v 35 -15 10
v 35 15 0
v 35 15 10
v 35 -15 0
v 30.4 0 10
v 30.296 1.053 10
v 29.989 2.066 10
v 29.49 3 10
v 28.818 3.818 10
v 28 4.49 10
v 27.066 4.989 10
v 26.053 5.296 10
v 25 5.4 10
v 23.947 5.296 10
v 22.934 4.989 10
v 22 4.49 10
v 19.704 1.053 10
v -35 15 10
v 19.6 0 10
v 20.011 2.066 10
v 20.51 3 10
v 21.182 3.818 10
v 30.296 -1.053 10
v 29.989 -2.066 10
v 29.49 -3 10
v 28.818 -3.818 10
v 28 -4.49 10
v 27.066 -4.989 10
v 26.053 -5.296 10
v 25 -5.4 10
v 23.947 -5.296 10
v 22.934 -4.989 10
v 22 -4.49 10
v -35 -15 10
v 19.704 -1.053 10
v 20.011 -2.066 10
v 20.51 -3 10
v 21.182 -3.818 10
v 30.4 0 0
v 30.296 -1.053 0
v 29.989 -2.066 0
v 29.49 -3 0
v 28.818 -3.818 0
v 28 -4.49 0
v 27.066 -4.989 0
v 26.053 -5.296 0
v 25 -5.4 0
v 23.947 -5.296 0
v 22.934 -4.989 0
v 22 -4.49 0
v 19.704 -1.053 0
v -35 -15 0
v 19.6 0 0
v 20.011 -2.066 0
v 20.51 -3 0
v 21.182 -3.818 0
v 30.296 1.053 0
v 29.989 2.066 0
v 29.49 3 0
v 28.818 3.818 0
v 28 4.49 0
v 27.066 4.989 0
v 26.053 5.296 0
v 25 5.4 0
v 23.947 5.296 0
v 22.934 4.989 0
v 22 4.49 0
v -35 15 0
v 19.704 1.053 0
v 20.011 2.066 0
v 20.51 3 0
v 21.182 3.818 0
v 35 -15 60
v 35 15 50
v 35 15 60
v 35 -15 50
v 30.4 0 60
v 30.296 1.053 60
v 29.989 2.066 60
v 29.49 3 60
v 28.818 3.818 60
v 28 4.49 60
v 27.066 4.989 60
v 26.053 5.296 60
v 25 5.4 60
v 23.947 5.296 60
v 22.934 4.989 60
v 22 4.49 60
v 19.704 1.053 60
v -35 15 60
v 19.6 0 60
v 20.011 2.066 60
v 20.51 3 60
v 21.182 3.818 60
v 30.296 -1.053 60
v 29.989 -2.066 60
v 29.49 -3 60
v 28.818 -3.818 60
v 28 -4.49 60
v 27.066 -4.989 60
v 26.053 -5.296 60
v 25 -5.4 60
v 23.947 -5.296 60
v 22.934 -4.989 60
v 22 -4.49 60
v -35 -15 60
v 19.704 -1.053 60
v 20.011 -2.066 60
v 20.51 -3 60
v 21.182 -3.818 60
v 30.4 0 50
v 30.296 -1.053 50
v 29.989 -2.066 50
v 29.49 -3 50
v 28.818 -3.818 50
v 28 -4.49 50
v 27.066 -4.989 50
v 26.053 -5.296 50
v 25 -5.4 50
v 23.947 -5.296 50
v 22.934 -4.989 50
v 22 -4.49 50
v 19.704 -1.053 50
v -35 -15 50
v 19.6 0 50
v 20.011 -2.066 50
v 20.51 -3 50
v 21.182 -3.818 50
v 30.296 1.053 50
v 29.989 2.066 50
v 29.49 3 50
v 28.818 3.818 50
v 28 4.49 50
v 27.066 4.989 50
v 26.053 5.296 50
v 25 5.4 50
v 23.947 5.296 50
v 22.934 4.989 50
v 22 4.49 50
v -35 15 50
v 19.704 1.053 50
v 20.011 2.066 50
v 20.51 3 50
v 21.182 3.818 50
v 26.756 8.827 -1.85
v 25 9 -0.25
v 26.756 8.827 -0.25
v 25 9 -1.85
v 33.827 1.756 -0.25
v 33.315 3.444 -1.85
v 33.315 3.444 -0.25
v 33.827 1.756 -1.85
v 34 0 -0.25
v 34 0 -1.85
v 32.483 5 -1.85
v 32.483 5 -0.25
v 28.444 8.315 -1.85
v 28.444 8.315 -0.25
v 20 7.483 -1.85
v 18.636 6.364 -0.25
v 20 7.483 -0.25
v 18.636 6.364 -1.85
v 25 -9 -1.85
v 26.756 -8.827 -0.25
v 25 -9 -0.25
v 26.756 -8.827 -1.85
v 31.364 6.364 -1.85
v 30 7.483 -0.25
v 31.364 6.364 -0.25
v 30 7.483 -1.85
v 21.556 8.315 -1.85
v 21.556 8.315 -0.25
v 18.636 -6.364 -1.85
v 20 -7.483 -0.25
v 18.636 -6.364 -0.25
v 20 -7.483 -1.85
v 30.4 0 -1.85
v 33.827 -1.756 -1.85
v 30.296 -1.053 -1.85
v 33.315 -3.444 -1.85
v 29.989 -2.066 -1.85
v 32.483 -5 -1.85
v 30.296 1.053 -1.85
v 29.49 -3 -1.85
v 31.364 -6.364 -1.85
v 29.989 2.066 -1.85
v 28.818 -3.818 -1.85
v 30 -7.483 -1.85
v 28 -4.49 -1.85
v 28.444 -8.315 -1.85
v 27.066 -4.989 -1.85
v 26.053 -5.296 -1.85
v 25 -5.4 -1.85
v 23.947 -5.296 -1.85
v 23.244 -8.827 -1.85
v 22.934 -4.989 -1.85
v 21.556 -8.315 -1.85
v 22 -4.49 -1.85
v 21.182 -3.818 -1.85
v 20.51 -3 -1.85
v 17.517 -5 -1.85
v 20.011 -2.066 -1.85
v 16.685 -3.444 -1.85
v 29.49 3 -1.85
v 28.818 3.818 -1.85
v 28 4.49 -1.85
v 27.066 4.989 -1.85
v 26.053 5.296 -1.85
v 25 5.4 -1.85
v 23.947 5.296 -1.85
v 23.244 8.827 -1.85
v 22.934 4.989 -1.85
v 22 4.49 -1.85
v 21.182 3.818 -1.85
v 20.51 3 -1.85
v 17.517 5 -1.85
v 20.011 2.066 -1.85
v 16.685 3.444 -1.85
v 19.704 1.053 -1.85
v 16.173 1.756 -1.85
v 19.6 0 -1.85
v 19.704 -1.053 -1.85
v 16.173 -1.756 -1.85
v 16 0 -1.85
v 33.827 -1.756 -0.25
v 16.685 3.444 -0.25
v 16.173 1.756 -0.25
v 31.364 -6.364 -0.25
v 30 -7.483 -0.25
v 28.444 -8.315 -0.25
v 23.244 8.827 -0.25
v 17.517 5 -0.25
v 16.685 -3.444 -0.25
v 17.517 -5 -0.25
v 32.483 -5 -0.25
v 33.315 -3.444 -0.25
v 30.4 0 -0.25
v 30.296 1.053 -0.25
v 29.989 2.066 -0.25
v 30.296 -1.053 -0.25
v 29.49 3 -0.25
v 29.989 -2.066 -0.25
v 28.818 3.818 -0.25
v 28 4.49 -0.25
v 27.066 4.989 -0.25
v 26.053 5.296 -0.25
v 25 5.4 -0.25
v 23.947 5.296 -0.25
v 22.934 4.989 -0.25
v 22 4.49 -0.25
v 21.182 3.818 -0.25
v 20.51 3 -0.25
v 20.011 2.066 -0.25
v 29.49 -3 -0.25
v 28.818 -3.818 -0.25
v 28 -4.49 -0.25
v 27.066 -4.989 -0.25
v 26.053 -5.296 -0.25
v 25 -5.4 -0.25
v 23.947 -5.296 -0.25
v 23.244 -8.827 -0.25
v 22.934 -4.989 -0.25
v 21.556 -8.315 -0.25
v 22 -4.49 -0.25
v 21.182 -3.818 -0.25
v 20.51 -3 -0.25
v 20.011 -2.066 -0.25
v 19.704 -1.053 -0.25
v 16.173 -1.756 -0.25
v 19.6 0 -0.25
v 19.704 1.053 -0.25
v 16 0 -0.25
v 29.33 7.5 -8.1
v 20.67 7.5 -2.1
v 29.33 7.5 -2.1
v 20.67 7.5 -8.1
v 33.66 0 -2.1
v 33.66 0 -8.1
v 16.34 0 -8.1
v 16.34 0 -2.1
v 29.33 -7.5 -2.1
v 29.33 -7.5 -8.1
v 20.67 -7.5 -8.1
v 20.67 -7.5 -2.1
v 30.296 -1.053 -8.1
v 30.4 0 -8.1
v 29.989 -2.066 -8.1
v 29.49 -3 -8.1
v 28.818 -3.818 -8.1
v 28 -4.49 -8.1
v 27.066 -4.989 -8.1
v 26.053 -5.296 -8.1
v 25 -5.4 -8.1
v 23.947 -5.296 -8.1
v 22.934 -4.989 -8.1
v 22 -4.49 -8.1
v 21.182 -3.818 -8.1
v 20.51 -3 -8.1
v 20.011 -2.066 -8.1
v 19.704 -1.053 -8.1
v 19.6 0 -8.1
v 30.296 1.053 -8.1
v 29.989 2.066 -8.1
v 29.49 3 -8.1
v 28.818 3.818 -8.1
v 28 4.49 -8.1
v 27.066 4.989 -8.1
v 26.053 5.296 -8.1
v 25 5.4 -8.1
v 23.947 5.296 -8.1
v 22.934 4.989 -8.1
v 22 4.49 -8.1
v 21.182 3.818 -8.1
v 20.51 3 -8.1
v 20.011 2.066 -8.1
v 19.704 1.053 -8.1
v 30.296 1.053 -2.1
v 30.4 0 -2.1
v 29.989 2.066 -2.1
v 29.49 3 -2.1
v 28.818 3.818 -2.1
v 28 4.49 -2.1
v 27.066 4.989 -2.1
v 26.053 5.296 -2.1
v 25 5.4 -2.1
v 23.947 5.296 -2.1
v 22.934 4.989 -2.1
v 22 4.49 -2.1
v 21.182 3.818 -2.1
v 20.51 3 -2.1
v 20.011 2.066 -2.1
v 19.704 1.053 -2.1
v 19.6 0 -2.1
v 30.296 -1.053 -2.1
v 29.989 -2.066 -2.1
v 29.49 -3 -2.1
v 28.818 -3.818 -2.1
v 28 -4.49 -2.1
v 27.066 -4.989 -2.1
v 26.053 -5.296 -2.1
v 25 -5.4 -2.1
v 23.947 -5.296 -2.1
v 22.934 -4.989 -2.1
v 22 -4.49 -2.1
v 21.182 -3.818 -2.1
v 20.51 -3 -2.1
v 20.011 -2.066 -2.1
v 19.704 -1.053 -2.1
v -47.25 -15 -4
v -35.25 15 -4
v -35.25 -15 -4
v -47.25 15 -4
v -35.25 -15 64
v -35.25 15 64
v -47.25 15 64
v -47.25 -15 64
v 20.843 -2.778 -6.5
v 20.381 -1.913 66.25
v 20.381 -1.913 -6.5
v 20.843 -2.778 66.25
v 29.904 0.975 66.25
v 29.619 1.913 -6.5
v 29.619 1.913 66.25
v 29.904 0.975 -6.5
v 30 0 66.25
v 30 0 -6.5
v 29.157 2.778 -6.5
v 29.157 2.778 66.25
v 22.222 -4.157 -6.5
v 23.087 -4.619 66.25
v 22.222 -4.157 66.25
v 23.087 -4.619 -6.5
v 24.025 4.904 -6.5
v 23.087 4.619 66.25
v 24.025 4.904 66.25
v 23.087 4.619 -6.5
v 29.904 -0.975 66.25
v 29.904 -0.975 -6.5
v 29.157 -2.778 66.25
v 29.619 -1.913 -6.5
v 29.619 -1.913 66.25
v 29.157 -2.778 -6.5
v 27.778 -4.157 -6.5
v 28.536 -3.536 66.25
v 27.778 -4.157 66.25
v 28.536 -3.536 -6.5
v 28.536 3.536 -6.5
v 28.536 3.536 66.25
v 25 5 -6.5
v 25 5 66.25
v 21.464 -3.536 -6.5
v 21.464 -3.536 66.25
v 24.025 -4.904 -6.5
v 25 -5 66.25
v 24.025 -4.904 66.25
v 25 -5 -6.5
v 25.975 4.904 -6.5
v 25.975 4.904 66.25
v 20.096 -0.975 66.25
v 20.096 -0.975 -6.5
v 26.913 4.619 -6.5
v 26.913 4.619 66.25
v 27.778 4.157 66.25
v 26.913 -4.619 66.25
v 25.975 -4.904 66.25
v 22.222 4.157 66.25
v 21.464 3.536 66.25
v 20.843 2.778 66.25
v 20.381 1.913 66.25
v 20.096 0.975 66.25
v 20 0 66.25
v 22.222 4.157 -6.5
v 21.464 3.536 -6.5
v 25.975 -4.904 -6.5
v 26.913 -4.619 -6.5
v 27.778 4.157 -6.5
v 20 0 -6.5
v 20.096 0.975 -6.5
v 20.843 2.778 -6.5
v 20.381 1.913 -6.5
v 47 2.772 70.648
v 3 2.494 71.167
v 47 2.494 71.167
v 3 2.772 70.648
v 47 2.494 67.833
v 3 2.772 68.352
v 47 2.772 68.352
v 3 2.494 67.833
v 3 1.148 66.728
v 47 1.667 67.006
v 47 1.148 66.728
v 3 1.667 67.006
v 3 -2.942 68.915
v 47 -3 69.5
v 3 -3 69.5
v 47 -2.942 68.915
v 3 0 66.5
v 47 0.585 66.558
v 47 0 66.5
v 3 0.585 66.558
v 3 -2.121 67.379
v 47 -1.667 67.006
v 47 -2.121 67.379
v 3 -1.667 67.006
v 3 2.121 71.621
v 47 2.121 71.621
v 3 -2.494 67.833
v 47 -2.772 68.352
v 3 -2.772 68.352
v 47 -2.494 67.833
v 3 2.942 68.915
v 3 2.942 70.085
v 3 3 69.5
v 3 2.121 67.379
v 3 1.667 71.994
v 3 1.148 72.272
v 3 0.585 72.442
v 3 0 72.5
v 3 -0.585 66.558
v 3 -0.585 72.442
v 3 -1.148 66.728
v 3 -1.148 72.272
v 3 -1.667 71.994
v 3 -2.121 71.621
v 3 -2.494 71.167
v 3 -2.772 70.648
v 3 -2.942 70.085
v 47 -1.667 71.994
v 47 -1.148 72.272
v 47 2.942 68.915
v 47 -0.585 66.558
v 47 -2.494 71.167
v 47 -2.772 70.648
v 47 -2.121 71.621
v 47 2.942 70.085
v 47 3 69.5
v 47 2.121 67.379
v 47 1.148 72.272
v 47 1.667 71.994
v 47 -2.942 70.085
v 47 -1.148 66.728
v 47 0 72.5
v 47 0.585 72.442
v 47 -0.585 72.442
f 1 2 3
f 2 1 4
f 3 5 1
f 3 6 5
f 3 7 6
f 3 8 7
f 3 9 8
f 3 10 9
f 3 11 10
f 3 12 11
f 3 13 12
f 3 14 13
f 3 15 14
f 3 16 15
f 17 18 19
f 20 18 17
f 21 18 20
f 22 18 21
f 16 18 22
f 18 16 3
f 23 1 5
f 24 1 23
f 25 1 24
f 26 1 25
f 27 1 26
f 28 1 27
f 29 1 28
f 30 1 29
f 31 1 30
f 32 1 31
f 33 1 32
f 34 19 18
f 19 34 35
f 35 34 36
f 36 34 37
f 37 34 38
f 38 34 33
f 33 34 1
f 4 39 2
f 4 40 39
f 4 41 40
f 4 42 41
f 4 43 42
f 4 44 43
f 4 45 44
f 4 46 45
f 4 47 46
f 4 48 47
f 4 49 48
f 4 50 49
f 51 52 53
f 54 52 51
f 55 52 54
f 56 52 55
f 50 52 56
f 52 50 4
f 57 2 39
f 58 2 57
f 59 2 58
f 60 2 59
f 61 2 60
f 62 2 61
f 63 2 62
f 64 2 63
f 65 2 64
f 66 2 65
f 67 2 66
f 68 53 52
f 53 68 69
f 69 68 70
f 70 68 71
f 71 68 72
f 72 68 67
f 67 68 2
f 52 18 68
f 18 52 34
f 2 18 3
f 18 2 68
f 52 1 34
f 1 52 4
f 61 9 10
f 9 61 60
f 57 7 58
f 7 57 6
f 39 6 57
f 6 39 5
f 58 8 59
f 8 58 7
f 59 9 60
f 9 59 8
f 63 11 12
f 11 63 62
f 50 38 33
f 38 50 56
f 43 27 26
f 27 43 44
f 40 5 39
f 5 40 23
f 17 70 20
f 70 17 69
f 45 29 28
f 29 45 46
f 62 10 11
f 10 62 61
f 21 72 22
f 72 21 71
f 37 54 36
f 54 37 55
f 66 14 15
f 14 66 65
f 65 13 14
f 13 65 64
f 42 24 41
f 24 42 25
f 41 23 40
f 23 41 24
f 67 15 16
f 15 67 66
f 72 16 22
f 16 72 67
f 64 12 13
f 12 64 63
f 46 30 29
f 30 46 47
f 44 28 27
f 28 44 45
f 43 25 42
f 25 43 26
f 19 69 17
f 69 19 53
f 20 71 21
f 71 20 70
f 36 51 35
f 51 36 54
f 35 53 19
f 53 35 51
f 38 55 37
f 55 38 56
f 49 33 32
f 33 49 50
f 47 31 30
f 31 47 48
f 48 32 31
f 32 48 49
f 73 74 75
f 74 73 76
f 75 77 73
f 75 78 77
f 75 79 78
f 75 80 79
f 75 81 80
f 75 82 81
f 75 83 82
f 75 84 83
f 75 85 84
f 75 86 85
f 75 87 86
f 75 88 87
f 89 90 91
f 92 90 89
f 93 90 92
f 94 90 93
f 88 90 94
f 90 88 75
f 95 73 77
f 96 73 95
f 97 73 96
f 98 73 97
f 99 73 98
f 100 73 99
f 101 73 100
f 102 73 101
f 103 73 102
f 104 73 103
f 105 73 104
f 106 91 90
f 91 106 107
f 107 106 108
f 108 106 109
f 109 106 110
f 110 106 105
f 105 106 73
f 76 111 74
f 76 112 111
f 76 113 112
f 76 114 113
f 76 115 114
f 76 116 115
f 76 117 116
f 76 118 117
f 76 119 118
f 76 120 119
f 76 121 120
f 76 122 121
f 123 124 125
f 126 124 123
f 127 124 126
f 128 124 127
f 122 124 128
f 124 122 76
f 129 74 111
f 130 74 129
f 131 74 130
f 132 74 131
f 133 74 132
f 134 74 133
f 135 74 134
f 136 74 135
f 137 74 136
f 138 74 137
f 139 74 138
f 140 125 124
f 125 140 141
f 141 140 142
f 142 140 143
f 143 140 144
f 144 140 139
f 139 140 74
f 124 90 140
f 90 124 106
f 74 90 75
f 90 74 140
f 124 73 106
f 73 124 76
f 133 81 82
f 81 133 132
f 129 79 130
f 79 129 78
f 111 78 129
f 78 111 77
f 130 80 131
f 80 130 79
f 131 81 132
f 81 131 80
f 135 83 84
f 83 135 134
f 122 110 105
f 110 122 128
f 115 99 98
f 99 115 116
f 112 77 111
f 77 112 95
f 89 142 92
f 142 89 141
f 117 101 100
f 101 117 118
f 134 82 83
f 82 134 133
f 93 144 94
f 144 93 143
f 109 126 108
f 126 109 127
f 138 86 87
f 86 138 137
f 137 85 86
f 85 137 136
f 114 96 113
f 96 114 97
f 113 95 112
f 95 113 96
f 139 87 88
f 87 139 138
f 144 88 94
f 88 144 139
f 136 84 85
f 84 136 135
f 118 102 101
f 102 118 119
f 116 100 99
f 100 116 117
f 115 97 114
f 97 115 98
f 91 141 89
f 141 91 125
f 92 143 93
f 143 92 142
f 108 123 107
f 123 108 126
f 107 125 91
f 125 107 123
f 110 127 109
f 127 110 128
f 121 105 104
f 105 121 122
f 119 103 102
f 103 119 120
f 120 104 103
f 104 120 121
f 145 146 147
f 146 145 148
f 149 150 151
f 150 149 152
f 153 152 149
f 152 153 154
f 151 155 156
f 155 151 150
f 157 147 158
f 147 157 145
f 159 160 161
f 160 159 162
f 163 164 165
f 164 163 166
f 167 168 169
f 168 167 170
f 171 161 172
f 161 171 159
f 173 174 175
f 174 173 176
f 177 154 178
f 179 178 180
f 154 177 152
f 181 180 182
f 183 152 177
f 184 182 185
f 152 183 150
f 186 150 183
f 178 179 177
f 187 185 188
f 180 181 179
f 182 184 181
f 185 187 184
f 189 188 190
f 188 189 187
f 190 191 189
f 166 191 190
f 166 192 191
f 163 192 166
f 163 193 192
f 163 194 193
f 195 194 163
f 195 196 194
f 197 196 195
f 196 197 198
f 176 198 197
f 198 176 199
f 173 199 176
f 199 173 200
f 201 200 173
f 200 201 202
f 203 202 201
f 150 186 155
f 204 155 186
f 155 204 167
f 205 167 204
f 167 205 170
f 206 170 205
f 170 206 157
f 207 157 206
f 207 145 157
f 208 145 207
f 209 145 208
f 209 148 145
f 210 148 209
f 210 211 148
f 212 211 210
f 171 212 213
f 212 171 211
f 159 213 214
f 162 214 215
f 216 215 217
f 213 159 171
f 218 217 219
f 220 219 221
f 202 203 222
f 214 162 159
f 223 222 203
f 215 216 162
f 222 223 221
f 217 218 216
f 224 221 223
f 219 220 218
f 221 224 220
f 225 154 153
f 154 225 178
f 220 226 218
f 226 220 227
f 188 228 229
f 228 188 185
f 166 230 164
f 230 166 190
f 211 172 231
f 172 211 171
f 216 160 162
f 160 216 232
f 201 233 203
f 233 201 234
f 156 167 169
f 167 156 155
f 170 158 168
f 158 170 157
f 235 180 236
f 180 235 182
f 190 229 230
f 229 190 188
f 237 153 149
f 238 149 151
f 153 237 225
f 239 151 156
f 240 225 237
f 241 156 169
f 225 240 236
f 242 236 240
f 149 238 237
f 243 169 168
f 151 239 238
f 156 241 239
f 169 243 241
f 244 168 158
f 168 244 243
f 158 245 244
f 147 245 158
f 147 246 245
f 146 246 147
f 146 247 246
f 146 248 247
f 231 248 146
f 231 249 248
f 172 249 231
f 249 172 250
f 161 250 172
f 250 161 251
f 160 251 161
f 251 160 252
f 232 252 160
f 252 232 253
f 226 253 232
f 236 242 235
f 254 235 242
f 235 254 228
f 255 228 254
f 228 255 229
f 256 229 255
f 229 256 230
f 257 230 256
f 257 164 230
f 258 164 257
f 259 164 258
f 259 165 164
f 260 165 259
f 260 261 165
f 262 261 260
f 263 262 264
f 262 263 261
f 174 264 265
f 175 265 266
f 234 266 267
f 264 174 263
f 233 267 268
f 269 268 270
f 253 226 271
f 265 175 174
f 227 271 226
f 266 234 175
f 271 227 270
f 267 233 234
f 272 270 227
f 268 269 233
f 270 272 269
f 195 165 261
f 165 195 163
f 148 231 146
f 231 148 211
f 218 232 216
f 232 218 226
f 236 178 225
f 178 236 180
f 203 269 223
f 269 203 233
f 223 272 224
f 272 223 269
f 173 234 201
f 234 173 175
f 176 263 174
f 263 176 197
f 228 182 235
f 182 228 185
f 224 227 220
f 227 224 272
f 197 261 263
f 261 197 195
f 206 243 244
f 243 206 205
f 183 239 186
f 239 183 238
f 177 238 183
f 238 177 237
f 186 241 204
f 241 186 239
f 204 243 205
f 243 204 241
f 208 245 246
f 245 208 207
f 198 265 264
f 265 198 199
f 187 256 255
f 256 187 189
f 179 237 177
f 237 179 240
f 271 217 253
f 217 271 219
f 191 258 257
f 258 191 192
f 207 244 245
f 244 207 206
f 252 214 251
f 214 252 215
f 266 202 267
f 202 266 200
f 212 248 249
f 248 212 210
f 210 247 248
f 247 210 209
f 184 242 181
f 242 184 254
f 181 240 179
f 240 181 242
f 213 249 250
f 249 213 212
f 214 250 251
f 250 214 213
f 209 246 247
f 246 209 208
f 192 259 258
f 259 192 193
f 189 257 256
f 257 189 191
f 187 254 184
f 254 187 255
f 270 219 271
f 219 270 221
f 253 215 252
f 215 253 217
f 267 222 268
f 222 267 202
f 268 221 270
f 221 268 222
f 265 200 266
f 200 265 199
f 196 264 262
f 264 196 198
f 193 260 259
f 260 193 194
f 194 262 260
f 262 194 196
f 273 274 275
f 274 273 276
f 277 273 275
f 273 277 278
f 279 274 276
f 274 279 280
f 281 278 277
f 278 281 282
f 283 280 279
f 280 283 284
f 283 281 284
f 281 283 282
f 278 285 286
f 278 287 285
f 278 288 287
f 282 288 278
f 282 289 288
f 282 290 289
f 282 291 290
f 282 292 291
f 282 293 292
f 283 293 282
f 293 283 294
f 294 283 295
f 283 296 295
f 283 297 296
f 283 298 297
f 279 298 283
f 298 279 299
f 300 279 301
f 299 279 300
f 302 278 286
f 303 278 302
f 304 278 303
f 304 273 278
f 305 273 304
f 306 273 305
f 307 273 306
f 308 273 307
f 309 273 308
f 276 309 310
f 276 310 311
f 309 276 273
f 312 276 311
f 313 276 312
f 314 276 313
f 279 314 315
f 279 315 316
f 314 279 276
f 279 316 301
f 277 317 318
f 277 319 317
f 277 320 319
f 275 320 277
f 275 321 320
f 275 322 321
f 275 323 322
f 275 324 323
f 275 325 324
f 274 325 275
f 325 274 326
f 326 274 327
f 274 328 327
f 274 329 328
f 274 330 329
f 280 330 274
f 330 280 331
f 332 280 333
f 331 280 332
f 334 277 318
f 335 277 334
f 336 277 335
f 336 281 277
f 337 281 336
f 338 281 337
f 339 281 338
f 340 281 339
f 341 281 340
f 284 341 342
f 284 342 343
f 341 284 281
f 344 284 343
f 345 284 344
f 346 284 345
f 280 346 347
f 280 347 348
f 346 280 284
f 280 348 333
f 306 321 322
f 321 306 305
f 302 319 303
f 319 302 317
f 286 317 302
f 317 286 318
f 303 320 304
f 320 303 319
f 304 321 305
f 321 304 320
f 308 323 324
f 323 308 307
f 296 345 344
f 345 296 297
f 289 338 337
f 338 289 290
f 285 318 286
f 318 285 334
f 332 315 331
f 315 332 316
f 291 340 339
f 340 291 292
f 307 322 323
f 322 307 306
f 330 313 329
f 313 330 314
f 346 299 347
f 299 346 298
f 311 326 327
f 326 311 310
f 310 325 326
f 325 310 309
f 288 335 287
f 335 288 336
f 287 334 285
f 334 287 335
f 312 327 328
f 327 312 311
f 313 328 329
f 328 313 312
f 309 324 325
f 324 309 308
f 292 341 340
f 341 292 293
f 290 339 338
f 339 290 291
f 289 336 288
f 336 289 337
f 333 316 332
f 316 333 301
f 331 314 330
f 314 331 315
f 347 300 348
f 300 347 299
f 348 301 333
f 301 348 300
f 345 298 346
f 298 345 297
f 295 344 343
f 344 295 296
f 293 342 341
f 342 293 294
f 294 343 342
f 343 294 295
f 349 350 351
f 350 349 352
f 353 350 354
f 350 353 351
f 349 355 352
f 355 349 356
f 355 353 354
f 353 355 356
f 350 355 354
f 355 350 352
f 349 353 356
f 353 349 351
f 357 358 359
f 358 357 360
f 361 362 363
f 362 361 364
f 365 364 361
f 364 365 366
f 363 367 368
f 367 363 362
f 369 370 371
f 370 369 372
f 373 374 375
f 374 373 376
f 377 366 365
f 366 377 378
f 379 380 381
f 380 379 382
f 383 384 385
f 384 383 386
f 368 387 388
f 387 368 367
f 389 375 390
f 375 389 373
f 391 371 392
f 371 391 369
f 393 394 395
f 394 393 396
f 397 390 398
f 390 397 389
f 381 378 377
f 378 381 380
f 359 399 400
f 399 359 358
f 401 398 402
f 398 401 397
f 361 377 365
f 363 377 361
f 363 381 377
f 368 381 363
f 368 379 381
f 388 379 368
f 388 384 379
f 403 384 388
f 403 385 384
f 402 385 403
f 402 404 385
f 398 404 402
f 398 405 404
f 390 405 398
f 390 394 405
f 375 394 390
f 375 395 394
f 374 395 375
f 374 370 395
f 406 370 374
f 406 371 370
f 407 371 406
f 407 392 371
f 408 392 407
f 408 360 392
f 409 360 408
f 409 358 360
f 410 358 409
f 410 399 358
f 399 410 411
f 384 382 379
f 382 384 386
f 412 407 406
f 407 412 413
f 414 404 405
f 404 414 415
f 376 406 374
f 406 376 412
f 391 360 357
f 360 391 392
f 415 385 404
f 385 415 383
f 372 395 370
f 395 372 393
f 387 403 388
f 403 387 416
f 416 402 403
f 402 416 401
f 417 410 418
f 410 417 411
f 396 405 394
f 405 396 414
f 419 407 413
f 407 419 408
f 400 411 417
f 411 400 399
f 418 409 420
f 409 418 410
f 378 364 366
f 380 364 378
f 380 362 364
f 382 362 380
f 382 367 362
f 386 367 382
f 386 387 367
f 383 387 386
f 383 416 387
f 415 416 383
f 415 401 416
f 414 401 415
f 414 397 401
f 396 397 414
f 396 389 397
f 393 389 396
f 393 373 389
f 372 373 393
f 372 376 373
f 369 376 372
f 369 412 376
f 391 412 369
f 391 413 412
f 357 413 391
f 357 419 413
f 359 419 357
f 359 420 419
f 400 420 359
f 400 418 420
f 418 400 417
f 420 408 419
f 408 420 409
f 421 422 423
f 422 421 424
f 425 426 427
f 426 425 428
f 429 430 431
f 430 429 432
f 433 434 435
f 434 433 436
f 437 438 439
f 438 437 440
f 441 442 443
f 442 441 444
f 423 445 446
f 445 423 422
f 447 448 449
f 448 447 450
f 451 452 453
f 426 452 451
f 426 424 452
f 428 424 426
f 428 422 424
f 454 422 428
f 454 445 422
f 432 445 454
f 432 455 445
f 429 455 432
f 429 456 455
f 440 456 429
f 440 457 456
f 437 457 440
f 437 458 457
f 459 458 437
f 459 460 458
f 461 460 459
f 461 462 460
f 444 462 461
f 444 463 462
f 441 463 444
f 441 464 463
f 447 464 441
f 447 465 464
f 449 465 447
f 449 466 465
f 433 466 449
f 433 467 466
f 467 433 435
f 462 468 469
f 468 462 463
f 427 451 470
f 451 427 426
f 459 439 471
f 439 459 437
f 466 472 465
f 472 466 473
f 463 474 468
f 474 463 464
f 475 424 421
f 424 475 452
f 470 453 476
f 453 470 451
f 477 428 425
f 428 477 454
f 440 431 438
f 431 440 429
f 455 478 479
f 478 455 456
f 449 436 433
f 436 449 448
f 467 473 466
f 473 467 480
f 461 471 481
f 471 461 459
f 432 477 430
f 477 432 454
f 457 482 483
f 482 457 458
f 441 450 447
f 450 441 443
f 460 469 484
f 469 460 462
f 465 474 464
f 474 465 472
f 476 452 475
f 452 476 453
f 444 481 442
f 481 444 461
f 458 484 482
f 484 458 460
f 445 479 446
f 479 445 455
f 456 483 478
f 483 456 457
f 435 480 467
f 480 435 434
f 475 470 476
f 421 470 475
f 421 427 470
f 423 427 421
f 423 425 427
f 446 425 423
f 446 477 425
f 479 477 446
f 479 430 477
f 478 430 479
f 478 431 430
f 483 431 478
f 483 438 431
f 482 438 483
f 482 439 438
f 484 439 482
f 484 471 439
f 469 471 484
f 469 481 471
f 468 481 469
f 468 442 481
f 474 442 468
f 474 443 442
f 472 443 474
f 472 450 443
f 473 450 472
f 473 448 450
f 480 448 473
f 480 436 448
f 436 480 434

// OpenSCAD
$fn = 32;

// ------------------------------------------------------------------------
// C clamp: throat 50 mm, screw d10
// Every part is its own module, assembly() places every instance.
// ------------------------------------------------------------------------

// --- part 1 ---
module clamp_arm() {
  difference() {
    translate([-35, -15, 0]) cube([70, 30, 10]);
    translate([25, 0, -1]) cylinder(h = 12, d = 10.8);
  }
}

// --- part 2 ---
module clamp_spine() {
  difference() {
    translate([-34, -15, 0]) cube([68, 30, 12]);
  }
}

// --- part 3 ---
module clamp_screw() {
  translate([0, 0, -36.375]) cylinder(h = 72.75, d = 10);
}

// --- part 4 ---
module clamp_washer() {
  difference() {
      translate([0, 0, 0]) cylinder(h = 1.6, d = 18);
      translate([0, 0, -1]) cylinder(h = 3.6, d = 10.8);
    }
}

// --- part 5 ---
module clamp_nut() {
  difference() {
    linear_extrude(height = 6) polygon(points = [[8.66, 0], [4.33, 7.5], [-4.33, 7.5], [-8.66, 0], [-4.33, -7.5], [4.33, -7.5]]);
    translate([0, 0, -1]) cylinder(h = 8, d = 10.8);
  }
}

// --- part 6 ---
module tommy_bar() {
  translate([0, 0, -22]) cylinder(h = 44, d = 6);
}

// --- assembly ---
module assembly() {
  color([0.80, 0.24, 0.20]) translate([0, 0, 0]) rotate([0, 0, 0]) clamp_arm();
  color([0.20, 0.45, 0.75]) translate([0, 0, 50]) rotate([0, 0, 0]) clamp_arm();
  color([0.25, 0.62, 0.32]) translate([-47.25, 0, 30]) rotate([0, 90, 0]) clamp_spine();
  color([0.92, 0.70, 0.18]) translate([25, 0, 29.875]) rotate([0, 0, 0]) clamp_screw();
  color([0.58, 0.35, 0.70]) translate([25, 0, -1.85]) rotate([0, 0, 0]) clamp_washer();
  color([0.16, 0.66, 0.66]) translate([25, 0, -8.1]) rotate([0, 0, 0]) clamp_nut();
  color([0.85, 0.48, 0.18]) translate([25, 0, 69.5]) rotate([0, 90, 0]) tommy_bar();
}

assembly();
